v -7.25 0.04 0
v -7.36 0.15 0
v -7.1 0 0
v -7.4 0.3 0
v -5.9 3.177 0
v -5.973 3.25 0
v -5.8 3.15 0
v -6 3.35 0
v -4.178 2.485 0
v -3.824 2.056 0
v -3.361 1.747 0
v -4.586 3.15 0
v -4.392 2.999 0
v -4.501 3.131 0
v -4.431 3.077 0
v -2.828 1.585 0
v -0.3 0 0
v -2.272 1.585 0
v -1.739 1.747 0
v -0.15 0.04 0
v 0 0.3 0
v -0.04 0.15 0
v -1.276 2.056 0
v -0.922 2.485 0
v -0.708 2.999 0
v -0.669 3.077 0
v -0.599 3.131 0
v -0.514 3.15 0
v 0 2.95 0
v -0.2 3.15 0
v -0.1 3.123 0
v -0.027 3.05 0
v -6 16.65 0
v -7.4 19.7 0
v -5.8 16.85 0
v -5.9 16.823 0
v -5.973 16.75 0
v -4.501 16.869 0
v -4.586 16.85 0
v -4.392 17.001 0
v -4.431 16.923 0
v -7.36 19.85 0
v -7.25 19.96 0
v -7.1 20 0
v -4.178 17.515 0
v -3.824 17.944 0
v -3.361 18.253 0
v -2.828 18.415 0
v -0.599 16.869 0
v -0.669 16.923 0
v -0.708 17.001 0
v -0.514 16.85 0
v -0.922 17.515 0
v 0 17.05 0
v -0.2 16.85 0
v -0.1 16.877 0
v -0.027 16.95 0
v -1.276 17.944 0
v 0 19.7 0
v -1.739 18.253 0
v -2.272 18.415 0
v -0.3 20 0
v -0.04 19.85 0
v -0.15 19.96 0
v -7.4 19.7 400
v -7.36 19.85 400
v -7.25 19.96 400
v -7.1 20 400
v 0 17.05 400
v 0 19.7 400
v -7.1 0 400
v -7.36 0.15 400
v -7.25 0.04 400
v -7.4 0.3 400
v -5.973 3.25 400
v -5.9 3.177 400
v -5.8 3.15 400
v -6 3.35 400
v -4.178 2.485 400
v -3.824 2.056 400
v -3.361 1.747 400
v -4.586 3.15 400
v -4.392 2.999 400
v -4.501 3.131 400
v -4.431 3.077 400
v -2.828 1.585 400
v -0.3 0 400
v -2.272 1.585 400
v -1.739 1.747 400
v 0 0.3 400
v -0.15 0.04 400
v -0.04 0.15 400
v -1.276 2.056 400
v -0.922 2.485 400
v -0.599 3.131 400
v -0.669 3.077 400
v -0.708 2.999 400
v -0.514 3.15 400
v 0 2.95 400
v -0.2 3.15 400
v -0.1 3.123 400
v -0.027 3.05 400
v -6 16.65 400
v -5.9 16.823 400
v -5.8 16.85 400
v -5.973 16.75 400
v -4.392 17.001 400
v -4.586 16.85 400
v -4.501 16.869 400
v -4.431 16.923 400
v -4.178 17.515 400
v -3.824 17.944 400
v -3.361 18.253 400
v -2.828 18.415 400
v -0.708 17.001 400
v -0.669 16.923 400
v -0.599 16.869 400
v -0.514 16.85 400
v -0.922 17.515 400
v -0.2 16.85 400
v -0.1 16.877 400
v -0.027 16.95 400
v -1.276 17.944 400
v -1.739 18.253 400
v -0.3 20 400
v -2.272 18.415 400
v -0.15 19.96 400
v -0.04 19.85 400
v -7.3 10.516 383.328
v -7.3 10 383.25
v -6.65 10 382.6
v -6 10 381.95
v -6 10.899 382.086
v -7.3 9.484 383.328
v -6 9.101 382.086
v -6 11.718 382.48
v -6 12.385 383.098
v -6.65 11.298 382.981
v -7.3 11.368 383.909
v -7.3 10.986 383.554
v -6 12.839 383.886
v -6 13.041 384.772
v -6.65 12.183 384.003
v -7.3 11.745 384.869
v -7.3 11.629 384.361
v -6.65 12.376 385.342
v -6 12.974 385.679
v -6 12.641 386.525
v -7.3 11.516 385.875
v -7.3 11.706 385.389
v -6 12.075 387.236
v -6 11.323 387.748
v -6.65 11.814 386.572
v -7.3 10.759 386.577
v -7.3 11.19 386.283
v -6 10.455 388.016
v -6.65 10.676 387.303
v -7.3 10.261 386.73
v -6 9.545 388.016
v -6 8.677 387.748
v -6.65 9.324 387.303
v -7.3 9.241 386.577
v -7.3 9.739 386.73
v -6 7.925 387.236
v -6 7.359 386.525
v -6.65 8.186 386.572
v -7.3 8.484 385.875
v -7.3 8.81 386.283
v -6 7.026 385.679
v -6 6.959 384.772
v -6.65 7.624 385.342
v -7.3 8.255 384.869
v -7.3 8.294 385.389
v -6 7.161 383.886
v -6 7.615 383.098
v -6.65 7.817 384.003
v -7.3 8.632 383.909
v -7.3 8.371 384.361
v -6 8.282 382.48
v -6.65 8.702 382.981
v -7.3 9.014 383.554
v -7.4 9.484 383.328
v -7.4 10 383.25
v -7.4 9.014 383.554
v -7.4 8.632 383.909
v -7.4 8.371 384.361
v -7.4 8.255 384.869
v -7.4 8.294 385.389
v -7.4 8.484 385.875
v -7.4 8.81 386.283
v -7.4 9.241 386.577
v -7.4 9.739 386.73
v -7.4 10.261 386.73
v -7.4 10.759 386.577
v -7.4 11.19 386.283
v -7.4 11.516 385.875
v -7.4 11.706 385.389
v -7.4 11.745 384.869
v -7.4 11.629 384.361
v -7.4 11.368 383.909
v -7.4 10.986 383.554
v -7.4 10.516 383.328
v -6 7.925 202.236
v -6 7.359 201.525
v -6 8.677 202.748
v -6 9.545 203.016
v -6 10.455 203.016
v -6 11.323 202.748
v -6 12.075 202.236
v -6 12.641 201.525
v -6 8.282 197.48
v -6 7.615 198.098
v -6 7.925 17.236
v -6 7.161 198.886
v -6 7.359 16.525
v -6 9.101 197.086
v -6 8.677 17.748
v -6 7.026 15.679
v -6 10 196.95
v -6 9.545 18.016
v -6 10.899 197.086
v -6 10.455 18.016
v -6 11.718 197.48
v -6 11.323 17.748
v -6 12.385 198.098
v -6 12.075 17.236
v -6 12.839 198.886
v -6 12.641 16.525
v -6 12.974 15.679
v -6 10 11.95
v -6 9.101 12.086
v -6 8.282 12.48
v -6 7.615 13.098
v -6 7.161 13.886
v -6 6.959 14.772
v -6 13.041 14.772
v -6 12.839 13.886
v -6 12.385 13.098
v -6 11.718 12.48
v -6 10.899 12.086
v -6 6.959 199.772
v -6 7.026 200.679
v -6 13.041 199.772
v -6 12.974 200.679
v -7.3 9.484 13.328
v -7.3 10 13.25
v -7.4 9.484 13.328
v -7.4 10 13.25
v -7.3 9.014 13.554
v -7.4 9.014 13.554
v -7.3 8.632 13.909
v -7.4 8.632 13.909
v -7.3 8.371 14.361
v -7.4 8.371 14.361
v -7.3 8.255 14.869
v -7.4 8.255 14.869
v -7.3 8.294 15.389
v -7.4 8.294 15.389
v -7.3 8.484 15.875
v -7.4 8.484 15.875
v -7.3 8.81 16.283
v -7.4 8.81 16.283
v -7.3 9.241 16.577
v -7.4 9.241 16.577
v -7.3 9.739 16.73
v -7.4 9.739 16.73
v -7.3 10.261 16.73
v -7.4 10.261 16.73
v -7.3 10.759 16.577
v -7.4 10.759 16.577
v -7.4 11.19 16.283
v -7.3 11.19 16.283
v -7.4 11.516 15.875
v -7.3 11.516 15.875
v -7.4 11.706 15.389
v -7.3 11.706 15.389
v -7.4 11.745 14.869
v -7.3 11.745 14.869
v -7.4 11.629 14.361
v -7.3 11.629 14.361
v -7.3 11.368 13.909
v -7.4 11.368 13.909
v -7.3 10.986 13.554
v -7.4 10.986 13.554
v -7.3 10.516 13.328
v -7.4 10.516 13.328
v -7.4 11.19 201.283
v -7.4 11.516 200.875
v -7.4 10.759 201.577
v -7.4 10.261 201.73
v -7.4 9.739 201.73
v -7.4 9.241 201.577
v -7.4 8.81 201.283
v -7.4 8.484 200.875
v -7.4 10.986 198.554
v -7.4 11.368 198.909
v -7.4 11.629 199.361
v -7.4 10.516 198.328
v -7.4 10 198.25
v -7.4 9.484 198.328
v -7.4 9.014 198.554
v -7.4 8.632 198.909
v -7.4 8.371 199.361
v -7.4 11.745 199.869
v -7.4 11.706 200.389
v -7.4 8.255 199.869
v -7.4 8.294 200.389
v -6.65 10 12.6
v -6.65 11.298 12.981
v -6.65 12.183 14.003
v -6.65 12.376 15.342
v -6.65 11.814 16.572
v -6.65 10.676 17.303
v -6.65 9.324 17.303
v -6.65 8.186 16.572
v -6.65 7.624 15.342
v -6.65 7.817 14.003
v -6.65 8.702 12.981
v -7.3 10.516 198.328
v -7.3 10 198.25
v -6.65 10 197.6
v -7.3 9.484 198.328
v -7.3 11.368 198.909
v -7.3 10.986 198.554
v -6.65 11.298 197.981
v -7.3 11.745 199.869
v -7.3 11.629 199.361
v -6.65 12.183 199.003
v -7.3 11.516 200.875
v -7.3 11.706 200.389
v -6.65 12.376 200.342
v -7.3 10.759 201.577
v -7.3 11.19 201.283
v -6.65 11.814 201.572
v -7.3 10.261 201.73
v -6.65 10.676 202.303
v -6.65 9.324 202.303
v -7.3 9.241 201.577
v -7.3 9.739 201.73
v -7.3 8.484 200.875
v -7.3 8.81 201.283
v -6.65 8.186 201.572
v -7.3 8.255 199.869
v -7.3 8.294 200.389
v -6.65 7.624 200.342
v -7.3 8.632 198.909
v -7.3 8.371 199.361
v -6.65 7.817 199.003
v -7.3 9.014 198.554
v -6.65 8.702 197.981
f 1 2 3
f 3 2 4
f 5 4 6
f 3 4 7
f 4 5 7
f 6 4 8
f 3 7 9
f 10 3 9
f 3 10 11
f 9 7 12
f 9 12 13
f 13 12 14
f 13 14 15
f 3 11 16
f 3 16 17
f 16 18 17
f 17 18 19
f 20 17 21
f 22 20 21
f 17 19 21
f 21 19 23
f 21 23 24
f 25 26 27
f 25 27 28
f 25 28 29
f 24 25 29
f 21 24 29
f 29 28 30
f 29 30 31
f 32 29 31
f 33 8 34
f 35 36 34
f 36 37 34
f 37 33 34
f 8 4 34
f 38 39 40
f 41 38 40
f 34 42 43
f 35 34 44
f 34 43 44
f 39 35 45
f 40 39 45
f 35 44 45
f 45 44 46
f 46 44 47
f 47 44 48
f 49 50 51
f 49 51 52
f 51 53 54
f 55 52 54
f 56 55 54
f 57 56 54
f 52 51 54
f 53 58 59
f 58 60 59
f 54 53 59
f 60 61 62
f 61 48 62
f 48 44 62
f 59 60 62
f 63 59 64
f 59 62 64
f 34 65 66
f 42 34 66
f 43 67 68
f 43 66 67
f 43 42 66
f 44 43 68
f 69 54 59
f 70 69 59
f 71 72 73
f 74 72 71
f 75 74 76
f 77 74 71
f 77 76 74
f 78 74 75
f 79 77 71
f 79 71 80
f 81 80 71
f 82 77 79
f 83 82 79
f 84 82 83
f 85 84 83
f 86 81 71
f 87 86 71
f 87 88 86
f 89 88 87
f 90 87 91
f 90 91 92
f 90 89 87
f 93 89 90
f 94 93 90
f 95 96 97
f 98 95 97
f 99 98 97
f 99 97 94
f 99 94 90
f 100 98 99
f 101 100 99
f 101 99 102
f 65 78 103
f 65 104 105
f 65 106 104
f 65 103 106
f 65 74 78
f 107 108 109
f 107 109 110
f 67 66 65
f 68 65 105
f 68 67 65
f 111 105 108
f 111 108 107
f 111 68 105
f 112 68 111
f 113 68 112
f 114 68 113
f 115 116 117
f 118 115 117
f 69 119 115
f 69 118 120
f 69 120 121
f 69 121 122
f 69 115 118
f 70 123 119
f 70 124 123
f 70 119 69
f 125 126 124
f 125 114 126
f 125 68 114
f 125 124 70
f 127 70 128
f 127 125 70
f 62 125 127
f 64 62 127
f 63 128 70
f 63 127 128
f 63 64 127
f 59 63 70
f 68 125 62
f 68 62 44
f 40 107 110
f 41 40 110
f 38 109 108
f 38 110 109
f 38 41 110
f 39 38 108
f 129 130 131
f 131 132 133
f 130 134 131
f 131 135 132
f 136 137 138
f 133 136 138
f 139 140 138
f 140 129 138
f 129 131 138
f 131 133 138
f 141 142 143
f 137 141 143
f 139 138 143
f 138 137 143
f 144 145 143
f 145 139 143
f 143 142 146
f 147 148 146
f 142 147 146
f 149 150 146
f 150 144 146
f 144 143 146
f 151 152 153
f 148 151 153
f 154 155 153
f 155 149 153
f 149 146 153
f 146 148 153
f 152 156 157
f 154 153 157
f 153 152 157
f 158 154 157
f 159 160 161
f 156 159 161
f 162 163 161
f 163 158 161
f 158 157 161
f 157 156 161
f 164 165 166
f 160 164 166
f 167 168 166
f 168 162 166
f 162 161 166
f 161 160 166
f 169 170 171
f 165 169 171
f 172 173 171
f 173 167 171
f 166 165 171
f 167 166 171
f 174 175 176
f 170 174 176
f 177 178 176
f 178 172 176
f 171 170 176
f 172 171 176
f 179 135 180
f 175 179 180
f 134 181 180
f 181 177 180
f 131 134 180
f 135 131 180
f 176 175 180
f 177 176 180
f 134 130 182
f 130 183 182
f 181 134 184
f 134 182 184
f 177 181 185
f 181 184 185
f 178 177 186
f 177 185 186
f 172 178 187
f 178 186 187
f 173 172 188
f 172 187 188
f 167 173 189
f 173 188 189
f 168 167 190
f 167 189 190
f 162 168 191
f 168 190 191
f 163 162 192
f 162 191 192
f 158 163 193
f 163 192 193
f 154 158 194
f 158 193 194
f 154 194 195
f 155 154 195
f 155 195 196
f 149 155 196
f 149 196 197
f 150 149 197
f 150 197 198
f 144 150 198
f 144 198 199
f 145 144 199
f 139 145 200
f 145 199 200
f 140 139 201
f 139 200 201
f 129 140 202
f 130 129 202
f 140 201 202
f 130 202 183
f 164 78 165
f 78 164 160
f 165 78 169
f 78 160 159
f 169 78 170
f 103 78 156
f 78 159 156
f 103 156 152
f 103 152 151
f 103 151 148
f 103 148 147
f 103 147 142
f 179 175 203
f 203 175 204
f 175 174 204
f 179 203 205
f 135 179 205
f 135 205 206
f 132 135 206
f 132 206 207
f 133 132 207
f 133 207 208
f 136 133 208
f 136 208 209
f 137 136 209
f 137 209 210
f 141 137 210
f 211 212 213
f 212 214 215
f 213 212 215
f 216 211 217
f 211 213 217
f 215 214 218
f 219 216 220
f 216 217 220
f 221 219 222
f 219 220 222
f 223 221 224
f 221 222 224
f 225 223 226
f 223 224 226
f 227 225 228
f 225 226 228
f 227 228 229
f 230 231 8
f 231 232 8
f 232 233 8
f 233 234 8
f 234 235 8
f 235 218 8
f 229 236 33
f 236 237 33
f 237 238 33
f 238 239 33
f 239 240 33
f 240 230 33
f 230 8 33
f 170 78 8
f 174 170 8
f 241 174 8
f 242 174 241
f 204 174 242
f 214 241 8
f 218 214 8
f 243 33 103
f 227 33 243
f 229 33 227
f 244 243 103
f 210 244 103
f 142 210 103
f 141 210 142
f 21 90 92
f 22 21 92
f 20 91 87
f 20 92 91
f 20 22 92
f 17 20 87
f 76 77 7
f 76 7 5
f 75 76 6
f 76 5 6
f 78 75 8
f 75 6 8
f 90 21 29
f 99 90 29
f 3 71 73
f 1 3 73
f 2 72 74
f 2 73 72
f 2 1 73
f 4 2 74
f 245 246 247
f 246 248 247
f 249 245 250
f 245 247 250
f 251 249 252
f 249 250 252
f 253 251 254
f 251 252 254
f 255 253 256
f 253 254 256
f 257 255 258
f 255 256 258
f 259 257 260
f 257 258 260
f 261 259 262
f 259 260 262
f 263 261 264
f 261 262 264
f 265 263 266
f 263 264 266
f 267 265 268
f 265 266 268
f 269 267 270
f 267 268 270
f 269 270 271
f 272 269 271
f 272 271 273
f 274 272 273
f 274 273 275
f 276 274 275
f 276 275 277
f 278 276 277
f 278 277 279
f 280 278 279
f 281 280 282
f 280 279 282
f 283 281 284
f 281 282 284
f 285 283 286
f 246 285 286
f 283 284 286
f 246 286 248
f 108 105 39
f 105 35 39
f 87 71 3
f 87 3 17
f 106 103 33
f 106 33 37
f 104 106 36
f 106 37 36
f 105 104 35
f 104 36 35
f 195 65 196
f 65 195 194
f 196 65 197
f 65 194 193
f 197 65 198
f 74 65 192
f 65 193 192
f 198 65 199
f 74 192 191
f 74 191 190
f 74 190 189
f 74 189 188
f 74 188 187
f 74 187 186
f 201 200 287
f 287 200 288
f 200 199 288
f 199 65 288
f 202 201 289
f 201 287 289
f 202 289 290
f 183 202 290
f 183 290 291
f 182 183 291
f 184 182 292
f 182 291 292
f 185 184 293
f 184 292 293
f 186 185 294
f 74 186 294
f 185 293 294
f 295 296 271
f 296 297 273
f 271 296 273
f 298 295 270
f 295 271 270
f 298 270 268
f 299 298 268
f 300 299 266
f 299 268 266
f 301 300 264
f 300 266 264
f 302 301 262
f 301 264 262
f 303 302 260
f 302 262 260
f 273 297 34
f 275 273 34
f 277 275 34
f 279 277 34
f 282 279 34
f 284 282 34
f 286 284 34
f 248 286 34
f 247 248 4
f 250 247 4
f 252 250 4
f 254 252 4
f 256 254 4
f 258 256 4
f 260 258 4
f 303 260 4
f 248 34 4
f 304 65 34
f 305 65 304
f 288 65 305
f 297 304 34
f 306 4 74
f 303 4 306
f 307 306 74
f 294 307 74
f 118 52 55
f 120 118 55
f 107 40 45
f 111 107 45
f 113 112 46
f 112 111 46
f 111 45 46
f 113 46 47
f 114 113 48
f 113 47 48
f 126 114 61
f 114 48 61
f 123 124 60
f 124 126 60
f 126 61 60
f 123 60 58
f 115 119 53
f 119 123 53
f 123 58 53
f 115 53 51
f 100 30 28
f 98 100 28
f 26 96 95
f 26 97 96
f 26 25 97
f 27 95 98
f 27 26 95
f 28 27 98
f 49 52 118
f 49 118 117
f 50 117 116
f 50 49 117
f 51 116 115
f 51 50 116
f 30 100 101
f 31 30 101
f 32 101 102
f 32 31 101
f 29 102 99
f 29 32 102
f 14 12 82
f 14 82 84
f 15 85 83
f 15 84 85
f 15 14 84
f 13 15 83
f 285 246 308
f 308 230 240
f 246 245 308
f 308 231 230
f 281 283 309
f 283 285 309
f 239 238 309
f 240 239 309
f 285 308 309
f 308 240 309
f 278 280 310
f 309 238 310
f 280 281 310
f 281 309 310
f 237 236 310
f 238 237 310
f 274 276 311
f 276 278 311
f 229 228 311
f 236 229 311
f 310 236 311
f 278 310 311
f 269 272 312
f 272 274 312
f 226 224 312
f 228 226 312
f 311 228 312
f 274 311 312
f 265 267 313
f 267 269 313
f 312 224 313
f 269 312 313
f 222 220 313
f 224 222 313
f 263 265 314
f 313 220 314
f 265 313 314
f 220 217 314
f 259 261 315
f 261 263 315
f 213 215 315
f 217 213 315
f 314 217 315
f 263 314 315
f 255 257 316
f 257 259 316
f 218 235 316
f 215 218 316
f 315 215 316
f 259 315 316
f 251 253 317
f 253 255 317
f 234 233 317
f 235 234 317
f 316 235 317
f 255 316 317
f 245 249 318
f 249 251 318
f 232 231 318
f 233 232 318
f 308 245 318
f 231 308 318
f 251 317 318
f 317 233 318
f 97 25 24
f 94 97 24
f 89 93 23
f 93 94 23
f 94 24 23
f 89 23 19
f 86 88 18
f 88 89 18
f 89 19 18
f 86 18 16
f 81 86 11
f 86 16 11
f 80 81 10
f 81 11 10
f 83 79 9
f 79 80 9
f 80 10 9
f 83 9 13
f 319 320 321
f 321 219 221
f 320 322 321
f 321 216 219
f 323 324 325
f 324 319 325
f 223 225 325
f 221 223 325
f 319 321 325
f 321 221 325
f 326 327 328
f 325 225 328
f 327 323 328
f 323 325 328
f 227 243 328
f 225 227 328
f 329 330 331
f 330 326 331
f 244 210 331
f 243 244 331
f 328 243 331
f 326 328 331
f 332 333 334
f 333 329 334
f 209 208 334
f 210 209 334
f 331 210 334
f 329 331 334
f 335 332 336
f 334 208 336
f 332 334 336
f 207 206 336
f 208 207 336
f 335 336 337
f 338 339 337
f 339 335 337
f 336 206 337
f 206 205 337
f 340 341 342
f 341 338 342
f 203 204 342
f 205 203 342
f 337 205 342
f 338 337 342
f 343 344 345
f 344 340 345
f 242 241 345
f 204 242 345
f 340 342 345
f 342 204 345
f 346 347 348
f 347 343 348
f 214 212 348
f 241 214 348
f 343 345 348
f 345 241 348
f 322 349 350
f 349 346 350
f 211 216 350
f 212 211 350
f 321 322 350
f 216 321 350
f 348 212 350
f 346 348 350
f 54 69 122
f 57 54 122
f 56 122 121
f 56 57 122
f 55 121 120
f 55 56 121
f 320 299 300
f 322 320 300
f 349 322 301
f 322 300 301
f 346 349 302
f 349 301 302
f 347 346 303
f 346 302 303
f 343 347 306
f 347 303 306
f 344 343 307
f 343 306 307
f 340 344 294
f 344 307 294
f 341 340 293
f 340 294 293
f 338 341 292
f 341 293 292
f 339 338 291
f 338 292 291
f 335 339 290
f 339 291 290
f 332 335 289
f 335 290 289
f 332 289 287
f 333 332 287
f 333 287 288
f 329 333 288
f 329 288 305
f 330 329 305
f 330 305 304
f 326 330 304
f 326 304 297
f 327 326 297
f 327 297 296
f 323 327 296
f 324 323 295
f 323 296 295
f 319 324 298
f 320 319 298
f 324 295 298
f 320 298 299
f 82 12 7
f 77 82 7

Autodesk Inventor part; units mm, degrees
sketch "Sketch_1" plane through (0, 0, 0) normal (0, 0, 1) x (1, 0, 0)
  line L0 (-7.4, 19.7) -> (-7.4, 0.3)
  arc A0 (-7.4, 0.3) -> (-7.1, 0) centre (-7.1, 0.3) ccw
  line L1 (-7.1, 0) -> (-0.3, 0)
  arc A1 (-0.3, 0) -> (0, 0.3) centre (-0.3, 0.3) ccw
  line L2 (0, 0.3) -> (0, 2.95)
  arc A2 (0, 2.95) -> (-0.2, 3.15) centre (-0.2, 2.95) ccw
  line L3 (-0.2, 3.15) -> (-0.5141, 3.15)
  arc A3 (-0.5141, 3.15) -> (-0.708, 2.999) centre (-0.5141, 2.95) ccw
  arc A4 (-4.392, 2.999) -> (-0.708, 2.999) centre (-2.55, 3.465) ccw
  arc A5 (-4.392, 2.999) -> (-4.5859, 3.15) centre (-4.5859, 2.95) ccw
  line L4 (-4.5859, 3.15) -> (-5.8, 3.15)
  arc A6 (-6, 3.35) -> (-5.8, 3.15) centre (-5.8, 3.35) ccw
  line L5 (-6, 3.35) -> (-6, 16.65)
  arc A7 (-5.8, 16.85) -> (-6, 16.65) centre (-5.8, 16.65) ccw
  line L6 (-5.8, 16.85) -> (-4.5859, 16.85)
  arc A8 (-4.5859, 16.85) -> (-4.392, 17.001) centre (-4.5859, 17.05) ccw
  arc A9 (-0.708, 17.001) -> (-4.392, 17.001) centre (-2.55, 16.535) ccw
  arc A10 (-0.708, 17.001) -> (-0.5141, 16.85) centre (-0.5141, 17.05) ccw
  line L7 (-0.5141, 16.85) -> (-0.2, 16.85)
  arc A11 (-0.2, 16.85) -> (0, 17.05) centre (-0.2, 17.05) ccw
  line L8 (0, 17.05) -> (0, 19.7)
  arc A12 (0, 19.7) -> (-0.3, 20) centre (-0.3, 19.7) ccw
  line L9 (-0.3, 20) -> (-7.1, 20)
  arc A13 (-7.1, 20) -> (-7.4, 19.7) centre (-7.1, 19.7) ccw
extrude "Extrusion1" add sketch "Sketch_1" along normal blind 400
sketch "Sketch2" plane through (-6, 3.35, 0) normal (1, 0, 0) x (0, 0, -1)
  point P0 (-15, 6.65)
hole "Hole1" at (-6, 10, 15) direction (-1, 0, 0) diameter 3.5 depth 1.4 countersink diameter 6.1 countersink angle 90
pattern_linear "Rectangular Pattern1" count 3 spacing 185 along (0, 0, 1) of "Hole1"
ref_plane "to_rail_XY" through (0.6, 10, 200) normal (0, 0, 1) x (1, 0, 0)
ref_plane "to_rail_YZ" through (0.6, 10, 200) normal (1, 0, 0) x (0, 1, 0)
ref_plane "to_rail_ZX" through (0.6, 10, 200) normal (0, 1, 0) x (0, 0, 1)
properties part number "SAR340-40_b"
